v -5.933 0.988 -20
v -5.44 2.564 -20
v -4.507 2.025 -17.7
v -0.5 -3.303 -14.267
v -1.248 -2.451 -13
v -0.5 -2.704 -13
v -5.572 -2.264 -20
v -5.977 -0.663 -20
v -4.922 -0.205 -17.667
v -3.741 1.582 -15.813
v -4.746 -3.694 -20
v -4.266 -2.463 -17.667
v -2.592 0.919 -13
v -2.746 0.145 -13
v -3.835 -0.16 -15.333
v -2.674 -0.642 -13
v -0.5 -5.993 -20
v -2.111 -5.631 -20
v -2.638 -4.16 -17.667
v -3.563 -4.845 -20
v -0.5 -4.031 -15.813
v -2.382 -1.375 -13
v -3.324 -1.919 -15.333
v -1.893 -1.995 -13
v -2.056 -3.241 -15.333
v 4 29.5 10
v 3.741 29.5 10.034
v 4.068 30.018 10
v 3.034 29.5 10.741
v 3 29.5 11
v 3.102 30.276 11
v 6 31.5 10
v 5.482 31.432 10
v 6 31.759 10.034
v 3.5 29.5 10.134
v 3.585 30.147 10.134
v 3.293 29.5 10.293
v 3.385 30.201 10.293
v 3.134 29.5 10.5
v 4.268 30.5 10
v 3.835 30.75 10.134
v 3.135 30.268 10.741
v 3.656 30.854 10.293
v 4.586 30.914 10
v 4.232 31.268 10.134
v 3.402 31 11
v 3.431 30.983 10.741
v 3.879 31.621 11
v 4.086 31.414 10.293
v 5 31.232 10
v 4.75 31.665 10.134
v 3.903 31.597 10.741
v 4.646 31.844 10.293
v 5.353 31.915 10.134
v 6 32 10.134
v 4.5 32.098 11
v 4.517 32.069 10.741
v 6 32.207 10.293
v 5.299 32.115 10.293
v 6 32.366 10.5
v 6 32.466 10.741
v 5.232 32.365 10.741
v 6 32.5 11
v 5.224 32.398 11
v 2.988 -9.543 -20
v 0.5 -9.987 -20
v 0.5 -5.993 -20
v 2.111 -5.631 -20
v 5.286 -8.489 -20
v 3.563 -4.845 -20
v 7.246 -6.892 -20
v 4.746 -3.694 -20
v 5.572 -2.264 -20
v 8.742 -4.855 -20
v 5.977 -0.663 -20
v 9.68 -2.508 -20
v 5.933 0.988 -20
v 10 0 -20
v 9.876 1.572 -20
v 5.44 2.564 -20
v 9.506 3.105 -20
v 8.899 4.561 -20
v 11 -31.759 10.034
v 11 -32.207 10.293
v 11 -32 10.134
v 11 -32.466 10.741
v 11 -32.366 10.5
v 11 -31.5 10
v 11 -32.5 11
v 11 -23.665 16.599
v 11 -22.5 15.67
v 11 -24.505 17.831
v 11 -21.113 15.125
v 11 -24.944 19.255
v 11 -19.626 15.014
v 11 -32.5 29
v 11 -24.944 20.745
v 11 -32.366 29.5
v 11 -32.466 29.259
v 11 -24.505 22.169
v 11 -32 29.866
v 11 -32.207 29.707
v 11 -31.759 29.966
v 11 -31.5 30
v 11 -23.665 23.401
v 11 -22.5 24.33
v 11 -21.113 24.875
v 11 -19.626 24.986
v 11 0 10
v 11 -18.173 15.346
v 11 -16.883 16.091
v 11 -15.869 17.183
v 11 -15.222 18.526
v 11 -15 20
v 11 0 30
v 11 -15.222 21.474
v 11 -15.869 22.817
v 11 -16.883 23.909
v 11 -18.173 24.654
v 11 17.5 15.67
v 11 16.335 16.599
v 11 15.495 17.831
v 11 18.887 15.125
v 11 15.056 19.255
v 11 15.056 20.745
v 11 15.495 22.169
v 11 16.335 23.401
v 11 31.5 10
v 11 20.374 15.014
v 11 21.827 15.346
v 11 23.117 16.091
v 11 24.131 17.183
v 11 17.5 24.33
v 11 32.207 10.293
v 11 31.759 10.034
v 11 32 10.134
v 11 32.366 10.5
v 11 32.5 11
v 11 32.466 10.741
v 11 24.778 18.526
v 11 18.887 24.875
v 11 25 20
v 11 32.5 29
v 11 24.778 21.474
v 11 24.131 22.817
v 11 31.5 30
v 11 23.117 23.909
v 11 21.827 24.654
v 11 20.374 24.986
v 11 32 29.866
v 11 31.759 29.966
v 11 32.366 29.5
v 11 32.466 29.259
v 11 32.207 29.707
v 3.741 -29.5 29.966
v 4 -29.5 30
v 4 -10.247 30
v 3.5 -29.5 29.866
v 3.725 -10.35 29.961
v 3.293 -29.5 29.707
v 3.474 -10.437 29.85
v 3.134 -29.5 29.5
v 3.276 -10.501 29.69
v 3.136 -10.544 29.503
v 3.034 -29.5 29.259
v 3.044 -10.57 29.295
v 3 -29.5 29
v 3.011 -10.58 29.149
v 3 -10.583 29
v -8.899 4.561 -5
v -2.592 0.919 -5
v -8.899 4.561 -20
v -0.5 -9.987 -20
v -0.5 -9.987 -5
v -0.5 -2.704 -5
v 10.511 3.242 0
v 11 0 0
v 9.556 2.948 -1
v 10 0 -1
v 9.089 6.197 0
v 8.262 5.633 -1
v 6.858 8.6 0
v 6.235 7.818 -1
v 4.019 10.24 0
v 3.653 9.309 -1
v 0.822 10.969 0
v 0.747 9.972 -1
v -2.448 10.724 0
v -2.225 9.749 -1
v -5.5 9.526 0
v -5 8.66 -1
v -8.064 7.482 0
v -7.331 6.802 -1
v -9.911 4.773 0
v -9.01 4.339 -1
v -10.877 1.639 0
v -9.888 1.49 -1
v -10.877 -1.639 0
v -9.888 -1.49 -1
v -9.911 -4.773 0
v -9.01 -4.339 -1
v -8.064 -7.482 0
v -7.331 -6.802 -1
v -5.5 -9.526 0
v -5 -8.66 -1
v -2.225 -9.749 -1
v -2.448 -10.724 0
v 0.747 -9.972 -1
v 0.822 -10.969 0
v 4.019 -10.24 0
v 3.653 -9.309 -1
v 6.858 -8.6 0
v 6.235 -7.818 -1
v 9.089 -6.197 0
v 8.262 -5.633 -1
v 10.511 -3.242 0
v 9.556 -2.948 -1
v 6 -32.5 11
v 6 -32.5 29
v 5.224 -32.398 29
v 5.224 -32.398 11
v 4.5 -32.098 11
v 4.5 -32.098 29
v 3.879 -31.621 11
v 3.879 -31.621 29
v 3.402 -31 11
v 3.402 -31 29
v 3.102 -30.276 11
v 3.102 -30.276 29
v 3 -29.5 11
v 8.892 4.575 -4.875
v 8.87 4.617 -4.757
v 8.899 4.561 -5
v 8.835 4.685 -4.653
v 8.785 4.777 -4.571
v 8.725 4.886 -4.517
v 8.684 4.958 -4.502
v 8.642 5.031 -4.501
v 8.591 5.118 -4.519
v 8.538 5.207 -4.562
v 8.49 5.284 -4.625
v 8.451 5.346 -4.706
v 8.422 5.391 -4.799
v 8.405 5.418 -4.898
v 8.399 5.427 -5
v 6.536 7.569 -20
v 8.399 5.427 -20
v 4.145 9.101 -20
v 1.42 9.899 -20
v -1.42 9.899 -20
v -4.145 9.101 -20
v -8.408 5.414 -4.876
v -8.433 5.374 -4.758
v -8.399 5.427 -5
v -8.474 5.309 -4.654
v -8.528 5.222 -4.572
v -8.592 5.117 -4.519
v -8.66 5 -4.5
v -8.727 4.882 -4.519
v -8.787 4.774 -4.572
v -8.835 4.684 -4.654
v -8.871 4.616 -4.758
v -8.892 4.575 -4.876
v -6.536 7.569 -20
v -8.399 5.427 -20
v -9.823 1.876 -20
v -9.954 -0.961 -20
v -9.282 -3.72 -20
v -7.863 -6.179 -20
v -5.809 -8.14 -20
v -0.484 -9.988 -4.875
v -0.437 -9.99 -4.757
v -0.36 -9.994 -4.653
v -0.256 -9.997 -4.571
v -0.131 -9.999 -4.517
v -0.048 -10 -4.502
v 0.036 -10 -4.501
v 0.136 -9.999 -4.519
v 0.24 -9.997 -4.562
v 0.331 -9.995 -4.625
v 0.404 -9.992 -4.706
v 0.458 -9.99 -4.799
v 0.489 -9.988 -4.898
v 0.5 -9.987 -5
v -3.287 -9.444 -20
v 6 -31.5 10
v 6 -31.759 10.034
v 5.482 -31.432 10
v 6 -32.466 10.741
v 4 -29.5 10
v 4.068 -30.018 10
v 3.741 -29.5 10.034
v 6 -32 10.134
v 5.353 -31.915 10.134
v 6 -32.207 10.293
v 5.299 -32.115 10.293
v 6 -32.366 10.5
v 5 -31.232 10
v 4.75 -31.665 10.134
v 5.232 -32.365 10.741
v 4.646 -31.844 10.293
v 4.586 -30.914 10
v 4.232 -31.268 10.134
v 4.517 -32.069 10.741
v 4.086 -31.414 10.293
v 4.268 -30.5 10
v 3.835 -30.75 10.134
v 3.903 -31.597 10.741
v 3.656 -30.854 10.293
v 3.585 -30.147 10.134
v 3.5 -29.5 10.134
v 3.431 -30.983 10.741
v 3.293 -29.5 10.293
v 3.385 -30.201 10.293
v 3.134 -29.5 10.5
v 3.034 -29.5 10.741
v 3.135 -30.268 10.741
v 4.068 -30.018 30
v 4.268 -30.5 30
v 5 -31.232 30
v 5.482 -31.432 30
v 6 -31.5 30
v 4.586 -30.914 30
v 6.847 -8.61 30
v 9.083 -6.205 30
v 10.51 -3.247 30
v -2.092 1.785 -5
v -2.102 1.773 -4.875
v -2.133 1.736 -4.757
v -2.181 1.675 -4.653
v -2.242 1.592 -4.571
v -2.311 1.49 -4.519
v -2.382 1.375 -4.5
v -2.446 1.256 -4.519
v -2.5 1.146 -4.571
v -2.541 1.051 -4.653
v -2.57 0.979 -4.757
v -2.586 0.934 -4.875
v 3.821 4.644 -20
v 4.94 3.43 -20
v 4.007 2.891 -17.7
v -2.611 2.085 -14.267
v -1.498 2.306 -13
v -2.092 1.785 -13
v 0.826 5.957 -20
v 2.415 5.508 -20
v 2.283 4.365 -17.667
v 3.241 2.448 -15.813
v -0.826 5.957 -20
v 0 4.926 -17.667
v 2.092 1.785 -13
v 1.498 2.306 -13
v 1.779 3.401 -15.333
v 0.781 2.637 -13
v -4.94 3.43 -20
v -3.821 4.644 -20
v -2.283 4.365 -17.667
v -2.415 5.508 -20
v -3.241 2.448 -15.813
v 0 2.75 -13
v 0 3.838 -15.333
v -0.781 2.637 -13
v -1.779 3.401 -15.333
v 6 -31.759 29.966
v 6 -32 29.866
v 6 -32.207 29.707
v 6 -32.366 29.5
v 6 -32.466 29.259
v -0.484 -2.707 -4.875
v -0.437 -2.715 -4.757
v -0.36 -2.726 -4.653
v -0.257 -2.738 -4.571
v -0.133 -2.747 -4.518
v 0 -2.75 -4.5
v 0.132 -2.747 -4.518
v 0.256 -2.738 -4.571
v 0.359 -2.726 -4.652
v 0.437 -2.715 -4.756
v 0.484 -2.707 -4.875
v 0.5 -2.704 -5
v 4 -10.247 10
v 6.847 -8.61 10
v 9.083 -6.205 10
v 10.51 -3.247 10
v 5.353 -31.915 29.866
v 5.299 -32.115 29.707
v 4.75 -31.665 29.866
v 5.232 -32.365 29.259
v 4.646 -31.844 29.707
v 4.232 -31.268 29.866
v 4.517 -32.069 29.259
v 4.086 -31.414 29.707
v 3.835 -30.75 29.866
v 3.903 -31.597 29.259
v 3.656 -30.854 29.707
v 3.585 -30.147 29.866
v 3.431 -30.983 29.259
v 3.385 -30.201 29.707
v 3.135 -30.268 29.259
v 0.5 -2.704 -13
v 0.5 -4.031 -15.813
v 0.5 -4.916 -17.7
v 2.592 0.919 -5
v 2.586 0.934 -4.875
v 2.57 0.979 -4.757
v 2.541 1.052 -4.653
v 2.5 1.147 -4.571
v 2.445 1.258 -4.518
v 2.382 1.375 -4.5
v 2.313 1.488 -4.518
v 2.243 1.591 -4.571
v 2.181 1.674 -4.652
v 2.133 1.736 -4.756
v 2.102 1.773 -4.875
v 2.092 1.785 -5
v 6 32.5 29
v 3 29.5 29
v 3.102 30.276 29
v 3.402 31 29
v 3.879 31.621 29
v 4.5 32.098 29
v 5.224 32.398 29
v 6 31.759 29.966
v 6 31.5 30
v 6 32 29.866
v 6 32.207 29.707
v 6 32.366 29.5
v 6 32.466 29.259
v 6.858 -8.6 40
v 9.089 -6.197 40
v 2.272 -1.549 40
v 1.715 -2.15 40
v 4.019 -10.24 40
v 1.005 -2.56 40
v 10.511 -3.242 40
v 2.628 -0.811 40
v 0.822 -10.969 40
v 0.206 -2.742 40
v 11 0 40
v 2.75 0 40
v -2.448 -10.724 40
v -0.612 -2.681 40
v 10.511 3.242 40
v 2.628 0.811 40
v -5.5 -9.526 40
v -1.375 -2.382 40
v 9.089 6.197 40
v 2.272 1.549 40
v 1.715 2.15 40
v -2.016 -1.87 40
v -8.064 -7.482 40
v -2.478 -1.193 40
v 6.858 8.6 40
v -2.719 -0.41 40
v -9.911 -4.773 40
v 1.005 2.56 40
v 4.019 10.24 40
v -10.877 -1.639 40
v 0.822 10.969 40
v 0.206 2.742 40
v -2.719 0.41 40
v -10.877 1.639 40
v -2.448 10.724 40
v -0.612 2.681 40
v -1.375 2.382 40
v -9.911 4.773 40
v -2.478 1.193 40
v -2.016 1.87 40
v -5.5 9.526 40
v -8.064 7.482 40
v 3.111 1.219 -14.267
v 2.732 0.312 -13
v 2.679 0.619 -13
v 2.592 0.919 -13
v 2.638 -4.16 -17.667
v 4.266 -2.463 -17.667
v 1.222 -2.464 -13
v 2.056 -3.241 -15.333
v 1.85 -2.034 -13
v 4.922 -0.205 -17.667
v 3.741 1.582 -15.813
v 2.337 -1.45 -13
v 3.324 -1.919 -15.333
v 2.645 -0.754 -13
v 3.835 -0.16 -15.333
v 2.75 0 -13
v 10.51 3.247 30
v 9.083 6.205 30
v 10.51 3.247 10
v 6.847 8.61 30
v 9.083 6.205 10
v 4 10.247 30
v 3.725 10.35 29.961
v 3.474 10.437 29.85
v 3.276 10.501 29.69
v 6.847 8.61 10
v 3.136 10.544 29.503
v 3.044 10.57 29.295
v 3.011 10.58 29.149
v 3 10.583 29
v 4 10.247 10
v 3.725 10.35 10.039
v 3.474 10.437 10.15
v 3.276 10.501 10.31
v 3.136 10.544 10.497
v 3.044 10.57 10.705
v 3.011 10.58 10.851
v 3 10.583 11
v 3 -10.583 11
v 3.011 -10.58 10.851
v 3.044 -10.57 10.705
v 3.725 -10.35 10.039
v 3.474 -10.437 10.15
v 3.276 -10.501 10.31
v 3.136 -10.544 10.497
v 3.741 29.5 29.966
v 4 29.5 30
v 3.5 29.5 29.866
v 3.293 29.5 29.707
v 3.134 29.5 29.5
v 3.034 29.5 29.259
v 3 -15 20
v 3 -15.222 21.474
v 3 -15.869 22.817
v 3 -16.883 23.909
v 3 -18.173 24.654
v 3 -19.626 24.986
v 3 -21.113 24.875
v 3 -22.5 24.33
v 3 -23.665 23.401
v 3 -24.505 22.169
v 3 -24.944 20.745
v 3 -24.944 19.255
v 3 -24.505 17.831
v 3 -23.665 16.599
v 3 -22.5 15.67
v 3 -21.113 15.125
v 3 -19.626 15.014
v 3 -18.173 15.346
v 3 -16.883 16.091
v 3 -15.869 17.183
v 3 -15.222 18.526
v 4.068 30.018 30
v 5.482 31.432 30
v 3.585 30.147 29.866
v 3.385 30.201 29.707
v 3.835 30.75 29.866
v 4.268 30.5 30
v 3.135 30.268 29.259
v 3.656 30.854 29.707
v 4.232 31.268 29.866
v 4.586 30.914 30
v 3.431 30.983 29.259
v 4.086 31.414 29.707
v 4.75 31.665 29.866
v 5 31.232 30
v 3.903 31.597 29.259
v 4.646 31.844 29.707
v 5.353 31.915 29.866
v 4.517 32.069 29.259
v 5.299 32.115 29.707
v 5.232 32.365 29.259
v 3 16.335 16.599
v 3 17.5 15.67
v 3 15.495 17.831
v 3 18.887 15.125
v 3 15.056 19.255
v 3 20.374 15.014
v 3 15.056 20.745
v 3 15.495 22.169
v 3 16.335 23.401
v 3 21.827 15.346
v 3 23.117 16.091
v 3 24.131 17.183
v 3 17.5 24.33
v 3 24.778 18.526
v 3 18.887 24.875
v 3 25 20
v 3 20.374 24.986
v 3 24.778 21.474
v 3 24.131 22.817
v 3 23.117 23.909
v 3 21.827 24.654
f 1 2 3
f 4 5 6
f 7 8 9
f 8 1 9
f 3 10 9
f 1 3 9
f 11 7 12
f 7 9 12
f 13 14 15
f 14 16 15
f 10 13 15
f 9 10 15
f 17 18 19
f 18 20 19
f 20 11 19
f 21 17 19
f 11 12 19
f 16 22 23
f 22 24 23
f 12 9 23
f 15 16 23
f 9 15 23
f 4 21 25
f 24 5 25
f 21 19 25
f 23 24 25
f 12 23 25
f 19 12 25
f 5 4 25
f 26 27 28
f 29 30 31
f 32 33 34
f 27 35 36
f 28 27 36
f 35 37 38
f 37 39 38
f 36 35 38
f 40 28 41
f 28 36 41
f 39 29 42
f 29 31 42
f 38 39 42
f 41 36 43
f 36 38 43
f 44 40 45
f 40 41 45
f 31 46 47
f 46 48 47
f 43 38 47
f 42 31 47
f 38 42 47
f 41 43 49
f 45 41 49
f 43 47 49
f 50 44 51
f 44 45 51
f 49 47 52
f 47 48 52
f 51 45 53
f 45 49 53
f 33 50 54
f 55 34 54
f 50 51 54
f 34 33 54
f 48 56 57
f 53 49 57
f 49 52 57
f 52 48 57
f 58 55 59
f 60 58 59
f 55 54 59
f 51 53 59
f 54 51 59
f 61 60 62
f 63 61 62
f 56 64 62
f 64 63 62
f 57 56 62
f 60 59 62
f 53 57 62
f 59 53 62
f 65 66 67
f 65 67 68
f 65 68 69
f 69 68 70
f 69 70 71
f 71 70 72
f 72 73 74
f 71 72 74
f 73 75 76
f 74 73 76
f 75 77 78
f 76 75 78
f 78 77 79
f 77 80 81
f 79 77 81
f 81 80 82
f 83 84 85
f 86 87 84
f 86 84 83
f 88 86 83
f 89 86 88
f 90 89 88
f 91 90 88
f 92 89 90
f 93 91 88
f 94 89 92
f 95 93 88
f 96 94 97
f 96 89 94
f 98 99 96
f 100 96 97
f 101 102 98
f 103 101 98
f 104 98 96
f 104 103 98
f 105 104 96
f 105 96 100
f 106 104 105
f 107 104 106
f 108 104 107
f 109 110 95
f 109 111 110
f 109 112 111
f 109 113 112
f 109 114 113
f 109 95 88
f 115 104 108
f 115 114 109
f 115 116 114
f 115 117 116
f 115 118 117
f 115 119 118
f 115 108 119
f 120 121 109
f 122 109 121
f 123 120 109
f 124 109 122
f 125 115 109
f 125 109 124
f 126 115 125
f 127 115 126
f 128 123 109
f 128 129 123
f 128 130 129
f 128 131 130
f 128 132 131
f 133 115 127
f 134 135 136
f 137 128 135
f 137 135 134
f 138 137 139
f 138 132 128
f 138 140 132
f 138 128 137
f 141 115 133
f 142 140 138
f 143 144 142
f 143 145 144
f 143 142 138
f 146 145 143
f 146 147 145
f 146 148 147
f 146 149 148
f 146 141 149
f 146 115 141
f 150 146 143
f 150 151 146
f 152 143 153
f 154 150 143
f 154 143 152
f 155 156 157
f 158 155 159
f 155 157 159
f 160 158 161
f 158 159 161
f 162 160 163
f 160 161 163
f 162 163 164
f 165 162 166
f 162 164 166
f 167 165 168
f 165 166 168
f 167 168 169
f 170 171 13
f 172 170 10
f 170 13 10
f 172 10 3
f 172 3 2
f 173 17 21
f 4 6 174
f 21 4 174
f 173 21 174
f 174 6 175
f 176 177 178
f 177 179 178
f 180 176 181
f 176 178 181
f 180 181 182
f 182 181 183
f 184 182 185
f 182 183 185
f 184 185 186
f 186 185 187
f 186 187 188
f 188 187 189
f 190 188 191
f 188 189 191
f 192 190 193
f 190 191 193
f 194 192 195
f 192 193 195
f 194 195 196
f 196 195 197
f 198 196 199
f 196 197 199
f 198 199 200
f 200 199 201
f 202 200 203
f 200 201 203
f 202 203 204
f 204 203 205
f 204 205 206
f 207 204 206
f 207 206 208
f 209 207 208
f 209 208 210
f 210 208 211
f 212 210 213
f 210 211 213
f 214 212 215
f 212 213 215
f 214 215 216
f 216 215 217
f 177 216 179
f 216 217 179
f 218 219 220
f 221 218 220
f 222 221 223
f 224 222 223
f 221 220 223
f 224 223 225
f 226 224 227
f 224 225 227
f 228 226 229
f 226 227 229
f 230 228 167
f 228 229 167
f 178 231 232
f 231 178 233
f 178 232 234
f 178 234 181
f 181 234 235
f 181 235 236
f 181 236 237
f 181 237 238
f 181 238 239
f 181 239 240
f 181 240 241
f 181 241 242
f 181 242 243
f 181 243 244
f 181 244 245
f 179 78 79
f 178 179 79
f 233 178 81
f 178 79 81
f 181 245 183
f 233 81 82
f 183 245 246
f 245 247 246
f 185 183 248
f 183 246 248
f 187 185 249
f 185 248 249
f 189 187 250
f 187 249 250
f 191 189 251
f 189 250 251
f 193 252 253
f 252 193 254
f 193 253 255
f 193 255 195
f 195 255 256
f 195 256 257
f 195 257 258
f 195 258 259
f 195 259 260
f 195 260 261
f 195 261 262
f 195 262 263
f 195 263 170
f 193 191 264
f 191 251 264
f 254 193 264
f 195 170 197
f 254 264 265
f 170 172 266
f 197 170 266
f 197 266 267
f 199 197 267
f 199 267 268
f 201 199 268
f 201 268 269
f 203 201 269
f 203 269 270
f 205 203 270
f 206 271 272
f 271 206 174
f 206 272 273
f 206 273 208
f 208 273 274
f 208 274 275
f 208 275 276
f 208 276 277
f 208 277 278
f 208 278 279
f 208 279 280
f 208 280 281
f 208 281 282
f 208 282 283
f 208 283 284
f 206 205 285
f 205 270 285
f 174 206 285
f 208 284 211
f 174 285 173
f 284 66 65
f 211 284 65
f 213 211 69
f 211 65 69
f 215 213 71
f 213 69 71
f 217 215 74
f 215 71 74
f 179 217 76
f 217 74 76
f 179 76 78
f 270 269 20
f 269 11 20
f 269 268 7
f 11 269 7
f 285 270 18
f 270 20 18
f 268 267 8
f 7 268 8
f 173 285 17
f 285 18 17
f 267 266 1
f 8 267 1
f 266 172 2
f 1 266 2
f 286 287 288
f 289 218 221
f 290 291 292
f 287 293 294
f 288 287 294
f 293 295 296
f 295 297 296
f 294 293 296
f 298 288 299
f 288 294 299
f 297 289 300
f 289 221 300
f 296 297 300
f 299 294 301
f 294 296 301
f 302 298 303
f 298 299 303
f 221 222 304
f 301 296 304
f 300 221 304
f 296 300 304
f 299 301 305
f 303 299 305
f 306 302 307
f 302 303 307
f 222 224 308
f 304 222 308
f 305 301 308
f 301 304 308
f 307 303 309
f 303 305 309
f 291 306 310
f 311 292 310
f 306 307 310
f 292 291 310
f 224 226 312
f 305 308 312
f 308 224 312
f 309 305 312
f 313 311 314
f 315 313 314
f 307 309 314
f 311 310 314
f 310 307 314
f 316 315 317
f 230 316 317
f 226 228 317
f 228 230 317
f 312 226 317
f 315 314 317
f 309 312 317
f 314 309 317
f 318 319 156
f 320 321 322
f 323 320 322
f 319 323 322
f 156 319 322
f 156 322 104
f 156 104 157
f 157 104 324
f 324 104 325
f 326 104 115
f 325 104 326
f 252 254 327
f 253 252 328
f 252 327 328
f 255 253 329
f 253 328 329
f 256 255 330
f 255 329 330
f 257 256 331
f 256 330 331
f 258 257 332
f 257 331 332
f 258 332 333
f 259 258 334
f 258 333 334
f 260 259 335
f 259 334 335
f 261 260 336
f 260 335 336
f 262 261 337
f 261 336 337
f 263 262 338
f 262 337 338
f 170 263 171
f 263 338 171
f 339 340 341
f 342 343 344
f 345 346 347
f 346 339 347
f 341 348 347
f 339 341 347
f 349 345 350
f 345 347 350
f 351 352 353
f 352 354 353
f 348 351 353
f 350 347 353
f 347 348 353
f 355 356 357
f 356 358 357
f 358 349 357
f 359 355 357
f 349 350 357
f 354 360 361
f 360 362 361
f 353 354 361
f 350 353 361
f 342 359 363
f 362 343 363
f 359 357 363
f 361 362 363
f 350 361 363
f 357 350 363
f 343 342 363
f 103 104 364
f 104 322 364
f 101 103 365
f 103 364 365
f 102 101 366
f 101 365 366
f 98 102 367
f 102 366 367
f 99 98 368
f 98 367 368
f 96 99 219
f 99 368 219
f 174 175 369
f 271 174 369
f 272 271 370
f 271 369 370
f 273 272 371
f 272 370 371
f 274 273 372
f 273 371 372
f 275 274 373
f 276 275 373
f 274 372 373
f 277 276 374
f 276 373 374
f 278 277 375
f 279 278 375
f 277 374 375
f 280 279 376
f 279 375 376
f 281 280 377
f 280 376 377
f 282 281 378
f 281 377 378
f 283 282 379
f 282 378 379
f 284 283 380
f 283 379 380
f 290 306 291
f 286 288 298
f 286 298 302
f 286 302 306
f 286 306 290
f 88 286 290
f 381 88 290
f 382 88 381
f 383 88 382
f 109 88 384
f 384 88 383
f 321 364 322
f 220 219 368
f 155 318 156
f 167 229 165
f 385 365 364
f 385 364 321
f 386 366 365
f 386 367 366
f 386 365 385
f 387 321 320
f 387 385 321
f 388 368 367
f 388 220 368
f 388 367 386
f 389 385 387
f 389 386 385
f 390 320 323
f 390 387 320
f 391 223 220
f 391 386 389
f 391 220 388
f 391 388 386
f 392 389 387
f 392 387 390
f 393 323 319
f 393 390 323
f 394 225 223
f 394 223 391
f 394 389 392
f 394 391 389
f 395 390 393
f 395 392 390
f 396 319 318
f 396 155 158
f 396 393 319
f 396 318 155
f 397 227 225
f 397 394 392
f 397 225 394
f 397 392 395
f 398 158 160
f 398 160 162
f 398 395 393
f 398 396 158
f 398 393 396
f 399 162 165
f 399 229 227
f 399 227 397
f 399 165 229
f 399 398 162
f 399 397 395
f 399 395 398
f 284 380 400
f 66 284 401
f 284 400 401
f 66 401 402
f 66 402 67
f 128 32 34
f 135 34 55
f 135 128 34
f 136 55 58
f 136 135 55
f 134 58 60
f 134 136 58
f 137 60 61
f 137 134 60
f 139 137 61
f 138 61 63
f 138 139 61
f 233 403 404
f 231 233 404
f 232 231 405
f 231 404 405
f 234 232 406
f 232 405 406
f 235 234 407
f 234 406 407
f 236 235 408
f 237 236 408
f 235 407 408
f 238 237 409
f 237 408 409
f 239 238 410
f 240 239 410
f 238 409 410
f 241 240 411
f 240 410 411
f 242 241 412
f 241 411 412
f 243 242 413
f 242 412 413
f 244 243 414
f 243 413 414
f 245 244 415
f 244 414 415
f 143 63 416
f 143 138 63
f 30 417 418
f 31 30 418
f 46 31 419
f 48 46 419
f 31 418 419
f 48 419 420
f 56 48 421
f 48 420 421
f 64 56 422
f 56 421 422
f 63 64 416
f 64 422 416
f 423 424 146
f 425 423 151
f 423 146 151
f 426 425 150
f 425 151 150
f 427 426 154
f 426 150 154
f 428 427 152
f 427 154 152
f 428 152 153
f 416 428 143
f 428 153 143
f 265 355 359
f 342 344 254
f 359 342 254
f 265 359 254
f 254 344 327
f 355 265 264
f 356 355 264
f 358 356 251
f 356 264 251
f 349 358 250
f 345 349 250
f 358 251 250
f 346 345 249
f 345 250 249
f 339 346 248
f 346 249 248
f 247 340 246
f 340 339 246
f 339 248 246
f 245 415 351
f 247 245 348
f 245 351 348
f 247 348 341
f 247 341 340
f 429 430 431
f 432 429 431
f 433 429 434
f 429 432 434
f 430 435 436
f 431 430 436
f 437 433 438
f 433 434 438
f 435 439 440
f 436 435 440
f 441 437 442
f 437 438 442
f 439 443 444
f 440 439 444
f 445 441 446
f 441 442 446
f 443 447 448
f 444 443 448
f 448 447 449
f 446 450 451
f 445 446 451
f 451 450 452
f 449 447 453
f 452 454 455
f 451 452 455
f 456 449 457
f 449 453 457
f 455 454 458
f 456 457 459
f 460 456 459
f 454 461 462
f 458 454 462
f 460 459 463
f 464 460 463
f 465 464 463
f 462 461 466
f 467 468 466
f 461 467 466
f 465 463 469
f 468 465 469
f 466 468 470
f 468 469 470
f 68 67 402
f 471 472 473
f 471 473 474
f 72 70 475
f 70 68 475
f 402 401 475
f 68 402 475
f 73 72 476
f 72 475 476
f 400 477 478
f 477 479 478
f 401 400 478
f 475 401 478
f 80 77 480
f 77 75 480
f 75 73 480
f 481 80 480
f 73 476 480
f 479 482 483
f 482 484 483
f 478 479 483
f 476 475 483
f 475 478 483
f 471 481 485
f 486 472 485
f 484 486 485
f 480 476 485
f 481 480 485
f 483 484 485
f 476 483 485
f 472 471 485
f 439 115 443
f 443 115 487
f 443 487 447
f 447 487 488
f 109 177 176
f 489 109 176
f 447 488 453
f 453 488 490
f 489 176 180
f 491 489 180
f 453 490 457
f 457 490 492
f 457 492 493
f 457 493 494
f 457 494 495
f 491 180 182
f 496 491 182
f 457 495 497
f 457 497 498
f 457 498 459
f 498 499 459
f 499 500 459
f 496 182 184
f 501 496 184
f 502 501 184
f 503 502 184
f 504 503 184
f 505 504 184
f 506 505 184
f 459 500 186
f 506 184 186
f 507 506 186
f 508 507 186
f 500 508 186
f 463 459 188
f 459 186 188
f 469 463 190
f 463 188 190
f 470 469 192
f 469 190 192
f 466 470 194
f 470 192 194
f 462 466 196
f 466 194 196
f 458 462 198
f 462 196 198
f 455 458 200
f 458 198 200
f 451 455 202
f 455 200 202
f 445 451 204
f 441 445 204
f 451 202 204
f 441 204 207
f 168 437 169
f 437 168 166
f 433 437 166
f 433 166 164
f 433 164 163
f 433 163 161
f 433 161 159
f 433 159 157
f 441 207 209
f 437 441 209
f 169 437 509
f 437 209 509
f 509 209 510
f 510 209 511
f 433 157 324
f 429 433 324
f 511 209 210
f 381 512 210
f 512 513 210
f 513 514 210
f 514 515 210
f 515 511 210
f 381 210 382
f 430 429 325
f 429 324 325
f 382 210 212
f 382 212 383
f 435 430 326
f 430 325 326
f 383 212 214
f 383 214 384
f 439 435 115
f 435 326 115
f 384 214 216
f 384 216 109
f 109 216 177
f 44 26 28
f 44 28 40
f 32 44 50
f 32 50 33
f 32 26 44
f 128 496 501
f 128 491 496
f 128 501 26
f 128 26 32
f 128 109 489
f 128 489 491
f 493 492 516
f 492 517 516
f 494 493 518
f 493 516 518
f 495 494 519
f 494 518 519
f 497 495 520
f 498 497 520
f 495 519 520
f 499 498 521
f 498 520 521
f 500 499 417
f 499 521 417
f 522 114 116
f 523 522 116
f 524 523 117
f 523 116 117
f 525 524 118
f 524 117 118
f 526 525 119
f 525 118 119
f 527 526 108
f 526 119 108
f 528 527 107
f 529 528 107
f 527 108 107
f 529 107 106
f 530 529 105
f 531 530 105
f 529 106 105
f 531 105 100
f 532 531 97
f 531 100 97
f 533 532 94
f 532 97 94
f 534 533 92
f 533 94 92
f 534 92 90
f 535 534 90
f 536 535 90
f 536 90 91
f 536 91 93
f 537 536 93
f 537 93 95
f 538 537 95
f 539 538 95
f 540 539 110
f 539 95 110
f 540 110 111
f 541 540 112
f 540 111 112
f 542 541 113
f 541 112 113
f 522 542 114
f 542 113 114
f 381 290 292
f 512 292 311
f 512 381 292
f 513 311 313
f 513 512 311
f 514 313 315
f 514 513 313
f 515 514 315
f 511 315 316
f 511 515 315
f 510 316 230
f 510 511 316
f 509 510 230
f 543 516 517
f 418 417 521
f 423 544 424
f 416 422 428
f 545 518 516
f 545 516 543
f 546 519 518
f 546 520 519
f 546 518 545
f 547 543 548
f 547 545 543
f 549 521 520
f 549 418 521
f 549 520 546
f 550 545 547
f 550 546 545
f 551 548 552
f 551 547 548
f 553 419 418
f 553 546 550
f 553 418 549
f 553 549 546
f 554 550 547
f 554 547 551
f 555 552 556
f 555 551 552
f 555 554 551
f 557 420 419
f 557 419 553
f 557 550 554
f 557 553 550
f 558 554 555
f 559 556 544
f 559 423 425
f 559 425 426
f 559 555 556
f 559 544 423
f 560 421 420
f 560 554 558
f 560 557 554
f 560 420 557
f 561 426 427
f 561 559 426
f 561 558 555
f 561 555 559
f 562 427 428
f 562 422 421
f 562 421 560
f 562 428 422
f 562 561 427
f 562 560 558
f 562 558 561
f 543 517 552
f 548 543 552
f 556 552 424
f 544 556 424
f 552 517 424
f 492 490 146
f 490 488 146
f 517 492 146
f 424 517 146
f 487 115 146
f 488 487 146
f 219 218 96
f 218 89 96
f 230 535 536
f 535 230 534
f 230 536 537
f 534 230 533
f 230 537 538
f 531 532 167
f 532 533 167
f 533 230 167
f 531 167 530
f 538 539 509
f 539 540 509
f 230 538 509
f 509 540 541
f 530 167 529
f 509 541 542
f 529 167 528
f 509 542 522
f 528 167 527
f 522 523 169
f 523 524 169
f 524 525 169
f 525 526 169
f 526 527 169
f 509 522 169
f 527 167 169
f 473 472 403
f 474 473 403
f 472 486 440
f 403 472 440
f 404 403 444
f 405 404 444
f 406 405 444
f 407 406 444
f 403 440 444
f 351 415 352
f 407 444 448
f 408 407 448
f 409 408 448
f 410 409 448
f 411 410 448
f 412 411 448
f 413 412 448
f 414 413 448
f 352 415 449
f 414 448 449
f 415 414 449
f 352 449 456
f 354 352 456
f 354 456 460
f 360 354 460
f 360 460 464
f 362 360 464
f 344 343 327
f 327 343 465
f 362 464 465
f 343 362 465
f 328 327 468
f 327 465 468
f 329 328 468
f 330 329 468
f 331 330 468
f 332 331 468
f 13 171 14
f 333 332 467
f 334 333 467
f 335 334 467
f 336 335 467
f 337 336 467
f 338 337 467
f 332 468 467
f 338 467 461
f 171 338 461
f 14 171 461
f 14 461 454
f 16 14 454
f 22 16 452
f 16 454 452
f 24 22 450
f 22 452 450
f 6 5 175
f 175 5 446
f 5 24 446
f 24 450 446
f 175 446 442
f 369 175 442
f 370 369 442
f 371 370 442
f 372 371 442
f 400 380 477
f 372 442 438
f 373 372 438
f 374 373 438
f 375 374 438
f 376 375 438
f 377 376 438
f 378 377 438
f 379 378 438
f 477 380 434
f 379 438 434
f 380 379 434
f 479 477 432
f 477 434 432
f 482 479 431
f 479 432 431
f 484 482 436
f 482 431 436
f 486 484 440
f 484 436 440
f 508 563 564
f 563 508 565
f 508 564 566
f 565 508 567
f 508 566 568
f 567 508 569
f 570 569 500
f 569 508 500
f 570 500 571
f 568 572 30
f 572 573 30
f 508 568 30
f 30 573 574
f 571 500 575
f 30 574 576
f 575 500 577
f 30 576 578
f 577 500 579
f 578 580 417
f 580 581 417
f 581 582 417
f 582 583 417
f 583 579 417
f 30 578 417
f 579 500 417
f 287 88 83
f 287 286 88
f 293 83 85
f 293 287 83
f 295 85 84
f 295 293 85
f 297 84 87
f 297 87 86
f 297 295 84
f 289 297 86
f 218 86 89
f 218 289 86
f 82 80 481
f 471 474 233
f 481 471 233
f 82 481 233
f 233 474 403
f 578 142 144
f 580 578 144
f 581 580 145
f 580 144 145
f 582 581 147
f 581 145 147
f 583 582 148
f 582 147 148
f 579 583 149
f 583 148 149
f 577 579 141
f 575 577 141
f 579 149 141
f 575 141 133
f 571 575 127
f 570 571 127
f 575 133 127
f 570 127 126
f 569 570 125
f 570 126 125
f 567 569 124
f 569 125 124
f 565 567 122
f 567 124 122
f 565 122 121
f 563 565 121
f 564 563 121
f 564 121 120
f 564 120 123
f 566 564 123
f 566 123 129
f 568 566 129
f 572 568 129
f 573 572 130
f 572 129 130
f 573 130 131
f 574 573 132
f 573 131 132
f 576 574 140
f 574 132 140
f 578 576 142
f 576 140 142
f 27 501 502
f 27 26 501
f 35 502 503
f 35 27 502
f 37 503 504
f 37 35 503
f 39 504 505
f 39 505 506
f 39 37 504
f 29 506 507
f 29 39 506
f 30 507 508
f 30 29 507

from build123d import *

# Parameters (mm, degrees)
POCKET_DEPTH       = 146.174962
POLARPATTERN_COUNT = 3
SKETCH002_W        = 65
SKETCH002_H        = 20
SKETCH002_R        = 5
PAD_DEPTH          = 8
FILLET_R           = 3
FILLET001_R        = 1


with BuildPart() as part:
    # Sketch → Revolution (revolve)
    with BuildSketch(Plane.XZ):
        Polygon((2.75, 40), (11, 40), (11, 0), (10, -1), (10, -20), (6.014154, -20), (2.75, -13), align=None)
    revolve(axis=Axis((0, 0, 0), (0, 0, 1)))

    # Sketch001 (on DatumPlane) → Pocket (cut, through all)
    with BuildSketch(Plane(origin=(0, 0, -20), x_dir=(1, 0, 0), z_dir=(0, 1, 0))):
        with BuildLine():
            Line((0.5, -15), (0.5, 20))
            Line((0.5, 20), (-0.5, 20))
            Line((-0.5, 20), (-0.5, -15))
            ThreePointArc((-0.5, -15), (0, -15.5), (0.5, -15))
        make_face()
    pocket = extrude(amount=-POCKET_DEPTH, mode=Mode.SUBTRACT)

    # PolarPattern: Pocket ×3 about axis
    polarpattern_axis = Axis((0, 0, 0), (0, 0, 1))
    for i in range(1, POLARPATTERN_COUNT):
        add(pocket.rotate(polarpattern_axis, i * 360 / POLARPATTERN_COUNT), mode=Mode.SUBTRACT)

    # Sketch002 (on DatumPlane) → Pad (join)
    with BuildSketch(Plane.YZ.offset(11)):
        with Locations((0, 20)):
            Rectangle(SKETCH002_W, SKETCH002_H)
        with Locations((-20, 20)):
            Circle(SKETCH002_R, mode=Mode.SUBTRACT)
        with Locations((20, 20)):
            Circle(SKETCH002_R, mode=Mode.SUBTRACT)
    extrude(amount=-PAD_DEPTH)

    # Fillet
    fillet_edges = [part.edges().sort_by_distance(p)[0] for p in [
        (3, -32.5, 20),
        (3, 32.5, 20),
    ]]
    fillet(fillet_edges, radius=FILLET_R)

    # Fillet001
    fillet001_edges = [part.edges().sort_by_distance(p)[0] for p in [
        (3, 20.041503, 30),
        (3, 20.041503, 10),
        (3, -20.041503, 10),
        (3, -20.041503, 30),
    ]]
    fillet(fillet001_edges, radius=FILLET001_R)


solid = part.part
